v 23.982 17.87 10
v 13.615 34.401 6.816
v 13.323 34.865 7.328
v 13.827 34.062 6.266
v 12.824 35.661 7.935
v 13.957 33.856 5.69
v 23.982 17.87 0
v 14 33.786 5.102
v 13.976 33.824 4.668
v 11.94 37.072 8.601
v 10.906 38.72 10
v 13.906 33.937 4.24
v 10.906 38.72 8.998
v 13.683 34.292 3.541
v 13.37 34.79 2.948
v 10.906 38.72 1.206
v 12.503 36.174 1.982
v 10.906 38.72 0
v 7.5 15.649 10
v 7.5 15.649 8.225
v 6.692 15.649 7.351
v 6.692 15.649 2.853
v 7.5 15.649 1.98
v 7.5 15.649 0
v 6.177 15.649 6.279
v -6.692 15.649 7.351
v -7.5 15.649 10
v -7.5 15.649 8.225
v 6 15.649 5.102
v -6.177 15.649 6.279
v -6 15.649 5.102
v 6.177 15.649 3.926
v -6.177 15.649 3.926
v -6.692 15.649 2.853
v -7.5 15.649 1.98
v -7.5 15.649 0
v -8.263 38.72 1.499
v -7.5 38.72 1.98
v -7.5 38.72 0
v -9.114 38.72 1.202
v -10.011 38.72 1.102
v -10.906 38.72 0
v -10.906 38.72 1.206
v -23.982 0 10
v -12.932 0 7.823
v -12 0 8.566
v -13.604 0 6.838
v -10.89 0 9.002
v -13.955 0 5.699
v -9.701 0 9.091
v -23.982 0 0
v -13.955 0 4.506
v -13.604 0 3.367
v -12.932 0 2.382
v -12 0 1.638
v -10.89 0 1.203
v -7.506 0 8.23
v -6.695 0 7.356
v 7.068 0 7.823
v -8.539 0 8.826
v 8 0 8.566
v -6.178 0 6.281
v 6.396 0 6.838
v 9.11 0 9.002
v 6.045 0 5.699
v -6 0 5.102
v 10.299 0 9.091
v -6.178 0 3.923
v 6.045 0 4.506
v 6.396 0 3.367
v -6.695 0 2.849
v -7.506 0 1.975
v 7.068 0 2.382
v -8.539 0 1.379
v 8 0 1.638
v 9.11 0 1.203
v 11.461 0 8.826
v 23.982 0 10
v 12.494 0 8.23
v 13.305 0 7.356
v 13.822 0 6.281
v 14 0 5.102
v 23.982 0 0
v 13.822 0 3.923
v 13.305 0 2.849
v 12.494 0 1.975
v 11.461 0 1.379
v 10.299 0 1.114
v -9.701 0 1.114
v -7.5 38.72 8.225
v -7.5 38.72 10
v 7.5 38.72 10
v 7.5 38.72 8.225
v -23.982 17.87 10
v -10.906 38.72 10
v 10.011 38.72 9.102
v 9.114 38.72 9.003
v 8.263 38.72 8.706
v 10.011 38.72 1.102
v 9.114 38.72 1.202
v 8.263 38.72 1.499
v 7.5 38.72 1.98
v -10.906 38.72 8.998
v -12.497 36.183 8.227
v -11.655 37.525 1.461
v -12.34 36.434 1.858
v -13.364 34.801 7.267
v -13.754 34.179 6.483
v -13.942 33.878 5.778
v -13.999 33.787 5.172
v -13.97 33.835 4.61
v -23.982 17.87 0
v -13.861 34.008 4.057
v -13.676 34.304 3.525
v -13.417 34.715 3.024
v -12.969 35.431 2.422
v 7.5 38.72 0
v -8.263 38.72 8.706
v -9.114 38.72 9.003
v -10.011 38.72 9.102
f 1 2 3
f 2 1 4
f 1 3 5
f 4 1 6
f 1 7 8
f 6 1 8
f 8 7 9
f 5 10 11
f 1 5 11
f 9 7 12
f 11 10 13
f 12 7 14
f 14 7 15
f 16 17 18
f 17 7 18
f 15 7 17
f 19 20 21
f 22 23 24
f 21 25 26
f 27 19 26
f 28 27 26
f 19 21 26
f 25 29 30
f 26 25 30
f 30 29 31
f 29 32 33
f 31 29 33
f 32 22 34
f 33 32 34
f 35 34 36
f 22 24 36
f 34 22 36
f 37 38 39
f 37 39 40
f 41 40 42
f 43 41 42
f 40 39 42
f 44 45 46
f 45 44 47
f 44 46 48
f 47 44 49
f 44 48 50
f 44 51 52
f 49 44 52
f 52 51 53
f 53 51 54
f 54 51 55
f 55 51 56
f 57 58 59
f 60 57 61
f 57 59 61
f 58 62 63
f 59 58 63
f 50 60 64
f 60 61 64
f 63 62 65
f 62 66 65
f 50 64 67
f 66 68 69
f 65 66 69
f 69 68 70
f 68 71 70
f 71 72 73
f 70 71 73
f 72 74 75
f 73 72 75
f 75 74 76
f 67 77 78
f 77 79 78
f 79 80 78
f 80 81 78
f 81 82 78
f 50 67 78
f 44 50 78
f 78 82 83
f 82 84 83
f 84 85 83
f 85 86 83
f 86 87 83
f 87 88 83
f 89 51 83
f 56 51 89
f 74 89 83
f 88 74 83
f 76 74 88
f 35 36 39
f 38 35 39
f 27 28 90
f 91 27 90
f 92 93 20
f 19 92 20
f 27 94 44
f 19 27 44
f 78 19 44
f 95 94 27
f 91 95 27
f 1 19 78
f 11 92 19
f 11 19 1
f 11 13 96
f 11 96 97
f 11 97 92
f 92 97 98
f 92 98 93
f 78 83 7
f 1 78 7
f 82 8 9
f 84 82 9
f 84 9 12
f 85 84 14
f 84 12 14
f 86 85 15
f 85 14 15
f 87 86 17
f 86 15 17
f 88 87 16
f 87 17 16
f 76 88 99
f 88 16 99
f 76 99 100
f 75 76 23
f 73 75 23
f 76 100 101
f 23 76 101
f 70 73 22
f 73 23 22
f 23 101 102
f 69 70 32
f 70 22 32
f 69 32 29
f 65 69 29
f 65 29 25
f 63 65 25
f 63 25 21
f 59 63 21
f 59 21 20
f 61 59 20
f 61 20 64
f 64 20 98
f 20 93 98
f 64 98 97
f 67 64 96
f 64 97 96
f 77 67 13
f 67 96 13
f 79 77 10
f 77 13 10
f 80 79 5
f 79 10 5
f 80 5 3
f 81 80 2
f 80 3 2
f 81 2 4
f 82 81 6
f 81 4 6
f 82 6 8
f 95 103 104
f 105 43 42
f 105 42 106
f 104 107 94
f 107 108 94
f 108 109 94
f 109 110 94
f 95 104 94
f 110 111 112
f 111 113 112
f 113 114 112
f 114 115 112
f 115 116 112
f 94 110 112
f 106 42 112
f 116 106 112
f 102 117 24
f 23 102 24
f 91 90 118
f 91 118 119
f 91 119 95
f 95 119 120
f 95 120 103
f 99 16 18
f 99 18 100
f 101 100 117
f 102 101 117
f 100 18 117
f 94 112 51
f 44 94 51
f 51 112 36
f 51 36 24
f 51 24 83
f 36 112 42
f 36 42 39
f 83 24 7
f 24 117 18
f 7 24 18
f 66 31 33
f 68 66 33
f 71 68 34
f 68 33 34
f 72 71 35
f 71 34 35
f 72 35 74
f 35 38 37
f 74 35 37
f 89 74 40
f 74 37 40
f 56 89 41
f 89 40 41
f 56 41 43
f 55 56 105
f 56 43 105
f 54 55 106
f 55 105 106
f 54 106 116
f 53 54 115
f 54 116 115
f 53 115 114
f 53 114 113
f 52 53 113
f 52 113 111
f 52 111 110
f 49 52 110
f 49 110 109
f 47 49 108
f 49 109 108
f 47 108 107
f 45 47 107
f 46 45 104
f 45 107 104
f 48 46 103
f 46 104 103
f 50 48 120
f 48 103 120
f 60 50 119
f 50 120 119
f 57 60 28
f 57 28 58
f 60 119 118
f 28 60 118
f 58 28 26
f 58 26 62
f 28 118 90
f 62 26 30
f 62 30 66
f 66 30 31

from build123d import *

# Parameters (mm, degrees)
BOSS_EXTRUDE1_DEPTH   = 10
F_8_0MM_DOWEL_HOLE1_D = 8


with BuildPart() as part:
    # Sketch1 → Boss-Extrude1 (new body)
    with BuildSketch(Plane.XY):
        Polygon((-23.981742881, 0), (23.981742881, 0), (23.981742881, 17.869578459), (10.906262583, 38.719668664), (7.5, 38.719668664), (7.5, 15.649448466), (-7.5, 15.649448466), (-7.5, 38.719668664), (-10.906262583, 38.719668664), (-23.981742881, 17.869578459), align=None)
    extrude(amount=BOSS_EXTRUDE1_DEPTH)

    # Ø8.0mm Dowel Hole1 (through all)
    with Locations(Plane(origin=(0, 0, 0), x_dir=(-1, 0, 0), z_dir=(0, -1, 0))):
        with Locations((10, -5.102347766), (-10, -5.102347766)):
            Hole(F_8_0MM_DOWEL_HOLE1_D / 2)


solid = part.part
